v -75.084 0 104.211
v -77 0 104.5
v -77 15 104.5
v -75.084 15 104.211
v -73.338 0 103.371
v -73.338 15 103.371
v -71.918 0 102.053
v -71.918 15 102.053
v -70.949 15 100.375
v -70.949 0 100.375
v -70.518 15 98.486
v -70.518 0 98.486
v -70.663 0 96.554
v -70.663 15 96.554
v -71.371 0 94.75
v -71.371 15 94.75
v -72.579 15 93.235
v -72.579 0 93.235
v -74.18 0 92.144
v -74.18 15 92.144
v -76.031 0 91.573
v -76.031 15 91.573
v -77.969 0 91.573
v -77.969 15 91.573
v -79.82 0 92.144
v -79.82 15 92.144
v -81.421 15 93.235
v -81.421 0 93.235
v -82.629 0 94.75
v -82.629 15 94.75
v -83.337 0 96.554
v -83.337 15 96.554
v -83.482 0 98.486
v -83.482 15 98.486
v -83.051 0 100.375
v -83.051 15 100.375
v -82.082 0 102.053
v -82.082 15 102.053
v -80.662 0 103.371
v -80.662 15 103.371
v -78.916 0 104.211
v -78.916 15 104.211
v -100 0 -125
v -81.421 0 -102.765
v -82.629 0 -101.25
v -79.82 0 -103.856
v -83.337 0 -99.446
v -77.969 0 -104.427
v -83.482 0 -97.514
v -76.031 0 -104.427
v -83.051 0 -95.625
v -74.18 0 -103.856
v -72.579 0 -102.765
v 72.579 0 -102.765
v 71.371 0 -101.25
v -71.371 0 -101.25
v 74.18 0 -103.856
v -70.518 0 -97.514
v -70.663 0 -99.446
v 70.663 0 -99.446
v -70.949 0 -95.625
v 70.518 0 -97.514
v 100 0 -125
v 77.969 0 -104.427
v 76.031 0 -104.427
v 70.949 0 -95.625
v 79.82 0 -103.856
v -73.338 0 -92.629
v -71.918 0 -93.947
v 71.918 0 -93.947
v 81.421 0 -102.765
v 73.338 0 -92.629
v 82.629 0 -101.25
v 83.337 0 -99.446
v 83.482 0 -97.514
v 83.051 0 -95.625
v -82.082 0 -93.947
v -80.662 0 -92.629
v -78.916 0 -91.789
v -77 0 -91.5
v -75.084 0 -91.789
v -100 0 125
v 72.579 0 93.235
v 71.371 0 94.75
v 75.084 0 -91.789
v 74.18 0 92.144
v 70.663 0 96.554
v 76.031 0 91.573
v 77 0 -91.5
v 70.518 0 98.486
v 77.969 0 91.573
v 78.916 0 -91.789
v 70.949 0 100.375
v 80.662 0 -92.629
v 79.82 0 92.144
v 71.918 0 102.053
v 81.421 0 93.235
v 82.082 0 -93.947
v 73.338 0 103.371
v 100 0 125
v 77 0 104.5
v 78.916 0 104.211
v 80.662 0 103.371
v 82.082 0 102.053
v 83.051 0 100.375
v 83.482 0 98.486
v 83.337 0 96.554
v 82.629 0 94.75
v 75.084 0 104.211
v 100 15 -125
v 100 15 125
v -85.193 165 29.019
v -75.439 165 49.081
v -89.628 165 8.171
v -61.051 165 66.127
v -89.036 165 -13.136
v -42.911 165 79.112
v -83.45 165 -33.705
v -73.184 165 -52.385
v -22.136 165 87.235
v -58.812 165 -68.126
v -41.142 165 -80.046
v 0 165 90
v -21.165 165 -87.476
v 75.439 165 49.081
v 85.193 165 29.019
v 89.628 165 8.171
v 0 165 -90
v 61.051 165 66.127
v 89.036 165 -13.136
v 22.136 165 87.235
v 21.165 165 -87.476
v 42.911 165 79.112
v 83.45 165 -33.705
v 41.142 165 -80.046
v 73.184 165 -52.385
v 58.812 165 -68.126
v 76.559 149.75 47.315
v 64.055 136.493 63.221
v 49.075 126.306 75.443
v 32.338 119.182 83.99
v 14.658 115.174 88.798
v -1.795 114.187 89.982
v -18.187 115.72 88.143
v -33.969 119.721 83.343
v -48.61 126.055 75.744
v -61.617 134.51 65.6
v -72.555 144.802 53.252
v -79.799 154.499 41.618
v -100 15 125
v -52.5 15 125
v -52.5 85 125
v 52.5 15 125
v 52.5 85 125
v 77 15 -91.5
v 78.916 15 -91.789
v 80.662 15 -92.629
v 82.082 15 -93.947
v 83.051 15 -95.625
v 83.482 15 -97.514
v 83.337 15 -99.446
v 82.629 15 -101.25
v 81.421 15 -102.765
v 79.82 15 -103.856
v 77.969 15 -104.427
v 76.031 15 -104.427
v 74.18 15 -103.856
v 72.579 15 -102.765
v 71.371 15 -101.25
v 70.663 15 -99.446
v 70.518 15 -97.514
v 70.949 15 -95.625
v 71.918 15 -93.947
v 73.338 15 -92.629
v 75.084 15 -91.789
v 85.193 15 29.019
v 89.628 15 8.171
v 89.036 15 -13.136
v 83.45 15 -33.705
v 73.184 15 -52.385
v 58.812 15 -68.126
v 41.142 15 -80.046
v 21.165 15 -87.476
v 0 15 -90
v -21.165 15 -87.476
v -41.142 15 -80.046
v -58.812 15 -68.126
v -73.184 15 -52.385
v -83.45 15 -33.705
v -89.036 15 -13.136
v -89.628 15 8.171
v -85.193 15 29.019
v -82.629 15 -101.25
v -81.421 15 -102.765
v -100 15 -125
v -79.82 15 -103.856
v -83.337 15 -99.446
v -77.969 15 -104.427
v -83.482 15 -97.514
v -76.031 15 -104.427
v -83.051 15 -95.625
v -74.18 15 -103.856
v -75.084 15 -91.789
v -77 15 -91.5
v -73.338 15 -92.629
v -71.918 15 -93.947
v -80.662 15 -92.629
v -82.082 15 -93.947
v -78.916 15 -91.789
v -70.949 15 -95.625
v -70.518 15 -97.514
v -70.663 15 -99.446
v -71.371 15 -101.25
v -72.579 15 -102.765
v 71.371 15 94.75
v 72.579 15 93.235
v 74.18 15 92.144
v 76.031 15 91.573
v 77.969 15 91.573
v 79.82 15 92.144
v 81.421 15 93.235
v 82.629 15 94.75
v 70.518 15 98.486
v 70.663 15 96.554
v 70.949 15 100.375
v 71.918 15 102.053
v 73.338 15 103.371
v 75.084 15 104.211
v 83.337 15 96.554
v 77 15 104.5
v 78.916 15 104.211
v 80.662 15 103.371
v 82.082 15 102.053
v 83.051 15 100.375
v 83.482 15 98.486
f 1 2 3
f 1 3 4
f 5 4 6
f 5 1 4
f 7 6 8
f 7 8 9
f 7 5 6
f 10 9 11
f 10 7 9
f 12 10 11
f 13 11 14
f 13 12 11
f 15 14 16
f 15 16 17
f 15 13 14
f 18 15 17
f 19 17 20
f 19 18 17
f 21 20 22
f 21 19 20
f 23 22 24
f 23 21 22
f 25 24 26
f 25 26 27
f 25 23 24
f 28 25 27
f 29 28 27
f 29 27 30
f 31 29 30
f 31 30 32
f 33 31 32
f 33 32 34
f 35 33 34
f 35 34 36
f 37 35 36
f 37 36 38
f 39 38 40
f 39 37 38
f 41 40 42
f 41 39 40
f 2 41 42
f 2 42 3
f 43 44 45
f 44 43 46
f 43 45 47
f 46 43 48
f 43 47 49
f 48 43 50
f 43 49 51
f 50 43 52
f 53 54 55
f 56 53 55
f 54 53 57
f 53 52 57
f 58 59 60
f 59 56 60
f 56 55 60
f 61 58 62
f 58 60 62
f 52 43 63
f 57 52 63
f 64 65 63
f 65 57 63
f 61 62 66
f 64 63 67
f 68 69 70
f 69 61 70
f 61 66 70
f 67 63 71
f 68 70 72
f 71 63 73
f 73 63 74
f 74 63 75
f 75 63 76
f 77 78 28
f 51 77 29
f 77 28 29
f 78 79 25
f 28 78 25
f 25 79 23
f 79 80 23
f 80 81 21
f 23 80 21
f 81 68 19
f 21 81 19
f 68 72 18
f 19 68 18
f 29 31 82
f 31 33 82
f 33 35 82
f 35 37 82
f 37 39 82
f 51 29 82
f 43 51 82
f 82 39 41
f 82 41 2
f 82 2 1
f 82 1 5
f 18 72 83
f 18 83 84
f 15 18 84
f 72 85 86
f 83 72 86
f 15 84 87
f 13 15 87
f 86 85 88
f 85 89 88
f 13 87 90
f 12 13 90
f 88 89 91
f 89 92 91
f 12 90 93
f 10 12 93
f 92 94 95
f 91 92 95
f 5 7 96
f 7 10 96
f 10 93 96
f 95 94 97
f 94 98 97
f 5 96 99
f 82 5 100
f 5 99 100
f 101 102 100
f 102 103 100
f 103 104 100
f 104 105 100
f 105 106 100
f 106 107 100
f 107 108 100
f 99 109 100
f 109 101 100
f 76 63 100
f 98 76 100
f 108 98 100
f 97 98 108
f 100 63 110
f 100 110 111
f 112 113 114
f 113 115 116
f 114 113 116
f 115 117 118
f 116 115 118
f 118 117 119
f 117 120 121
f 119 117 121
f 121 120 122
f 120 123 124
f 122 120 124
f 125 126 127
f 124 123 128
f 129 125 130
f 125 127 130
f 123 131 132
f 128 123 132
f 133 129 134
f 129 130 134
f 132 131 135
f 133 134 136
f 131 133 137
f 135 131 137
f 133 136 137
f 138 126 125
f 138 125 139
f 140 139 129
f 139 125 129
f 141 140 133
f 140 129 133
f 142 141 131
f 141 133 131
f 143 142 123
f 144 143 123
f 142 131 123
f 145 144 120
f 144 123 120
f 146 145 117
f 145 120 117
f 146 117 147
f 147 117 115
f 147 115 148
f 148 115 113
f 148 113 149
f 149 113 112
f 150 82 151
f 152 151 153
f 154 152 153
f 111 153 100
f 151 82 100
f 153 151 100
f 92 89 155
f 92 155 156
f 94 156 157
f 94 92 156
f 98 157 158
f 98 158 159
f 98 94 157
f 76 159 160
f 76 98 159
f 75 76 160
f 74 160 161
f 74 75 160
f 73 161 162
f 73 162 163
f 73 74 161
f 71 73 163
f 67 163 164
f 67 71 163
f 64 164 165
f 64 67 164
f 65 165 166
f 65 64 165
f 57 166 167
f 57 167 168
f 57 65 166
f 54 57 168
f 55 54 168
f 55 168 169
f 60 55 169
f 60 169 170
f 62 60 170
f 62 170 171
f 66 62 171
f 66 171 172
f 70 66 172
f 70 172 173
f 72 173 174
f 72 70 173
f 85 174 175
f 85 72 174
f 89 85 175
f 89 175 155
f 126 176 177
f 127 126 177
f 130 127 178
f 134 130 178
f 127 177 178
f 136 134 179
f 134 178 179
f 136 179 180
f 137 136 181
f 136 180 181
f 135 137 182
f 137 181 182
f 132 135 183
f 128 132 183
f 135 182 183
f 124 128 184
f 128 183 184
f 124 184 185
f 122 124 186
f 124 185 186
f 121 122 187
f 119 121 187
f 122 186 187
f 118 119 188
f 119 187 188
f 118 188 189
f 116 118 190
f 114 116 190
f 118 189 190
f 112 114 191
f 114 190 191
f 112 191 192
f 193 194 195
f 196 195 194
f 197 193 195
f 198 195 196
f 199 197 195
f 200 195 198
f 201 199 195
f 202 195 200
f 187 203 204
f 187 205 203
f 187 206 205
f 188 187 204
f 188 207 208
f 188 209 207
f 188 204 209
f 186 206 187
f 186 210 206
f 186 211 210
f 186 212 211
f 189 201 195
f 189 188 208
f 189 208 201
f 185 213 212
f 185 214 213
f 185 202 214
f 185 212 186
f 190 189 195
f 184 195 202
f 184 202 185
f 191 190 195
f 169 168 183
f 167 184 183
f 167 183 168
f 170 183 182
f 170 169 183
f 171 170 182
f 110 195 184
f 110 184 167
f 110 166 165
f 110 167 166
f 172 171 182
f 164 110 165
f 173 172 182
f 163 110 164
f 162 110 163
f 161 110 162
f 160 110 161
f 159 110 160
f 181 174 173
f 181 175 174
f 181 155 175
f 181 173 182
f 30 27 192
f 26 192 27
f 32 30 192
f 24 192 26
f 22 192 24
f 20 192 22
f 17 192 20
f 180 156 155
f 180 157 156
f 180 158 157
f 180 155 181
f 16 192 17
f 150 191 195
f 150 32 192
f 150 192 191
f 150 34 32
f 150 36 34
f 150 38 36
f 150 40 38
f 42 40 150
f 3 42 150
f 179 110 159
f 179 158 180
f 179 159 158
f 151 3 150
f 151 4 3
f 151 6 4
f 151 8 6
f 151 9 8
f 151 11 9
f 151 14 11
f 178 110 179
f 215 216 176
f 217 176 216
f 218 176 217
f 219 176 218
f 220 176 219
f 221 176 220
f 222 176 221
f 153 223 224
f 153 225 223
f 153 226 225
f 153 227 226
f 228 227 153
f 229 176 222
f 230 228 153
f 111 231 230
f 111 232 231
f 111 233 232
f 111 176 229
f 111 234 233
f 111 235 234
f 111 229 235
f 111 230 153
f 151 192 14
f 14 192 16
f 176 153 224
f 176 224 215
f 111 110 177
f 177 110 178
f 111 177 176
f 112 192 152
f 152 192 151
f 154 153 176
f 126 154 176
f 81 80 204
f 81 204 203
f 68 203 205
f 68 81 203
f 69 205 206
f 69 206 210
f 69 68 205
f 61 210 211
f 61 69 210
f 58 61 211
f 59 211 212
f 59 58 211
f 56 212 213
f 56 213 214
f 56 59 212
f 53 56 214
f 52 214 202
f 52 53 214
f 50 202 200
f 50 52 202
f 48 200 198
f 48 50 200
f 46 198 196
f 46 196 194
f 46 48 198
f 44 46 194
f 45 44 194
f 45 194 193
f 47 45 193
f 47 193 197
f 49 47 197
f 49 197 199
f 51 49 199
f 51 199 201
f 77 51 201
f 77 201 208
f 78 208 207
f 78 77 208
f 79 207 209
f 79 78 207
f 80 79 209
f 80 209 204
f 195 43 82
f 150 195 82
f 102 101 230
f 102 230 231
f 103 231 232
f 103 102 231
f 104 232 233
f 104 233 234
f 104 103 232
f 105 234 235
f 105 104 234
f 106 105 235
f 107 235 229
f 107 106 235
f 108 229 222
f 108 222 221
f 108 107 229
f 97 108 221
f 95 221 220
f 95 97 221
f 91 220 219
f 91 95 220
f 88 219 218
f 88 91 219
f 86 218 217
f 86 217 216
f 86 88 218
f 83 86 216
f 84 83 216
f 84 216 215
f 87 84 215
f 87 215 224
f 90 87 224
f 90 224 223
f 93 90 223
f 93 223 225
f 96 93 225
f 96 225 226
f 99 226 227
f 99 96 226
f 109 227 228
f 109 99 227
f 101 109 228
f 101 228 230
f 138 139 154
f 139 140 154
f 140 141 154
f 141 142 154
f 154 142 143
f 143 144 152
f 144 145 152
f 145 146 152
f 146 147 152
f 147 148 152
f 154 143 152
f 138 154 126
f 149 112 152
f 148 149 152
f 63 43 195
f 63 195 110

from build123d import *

# Parameters (mm, degrees)
SKETCH1_W               = 250
SKETCH1_H               = 200
SKETCH1_R               = 6.5
BOSS_EXTRUDE1_DEPTH     = 15
BOSS_EXTRUDE2_DEPTH     = 150
CUT_EXTRUDE1_DEPTH      = 101
CUT_EXTRUDE1_DEPTH_BACK = 101
BOSS_EXTRUDE3_REACH     = 167
BODY_MOVE_COPY1_ANGLE   = 90


with BuildPart() as part:
    # Sketch1 → Boss-Extrude1 (new body)
    with BuildSketch(Plane(origin=(0, 0, 0), x_dir=(1, 0, 0), z_dir=(0, 1, 0))):
        Rectangle(SKETCH1_W, SKETCH1_H)
        with Locations((-98, 77)):
            Circle(SKETCH1_R, mode=Mode.SUBTRACT)
        with Locations((98, 77)):
            Circle(SKETCH1_R, mode=Mode.SUBTRACT)
        with Locations((-98, -77)):
            Circle(SKETCH1_R, mode=Mode.SUBTRACT)
        with Locations((98, -77)):
            Circle(SKETCH1_R, mode=Mode.SUBTRACT)
    extrude(amount=BOSS_EXTRUDE1_DEPTH)

    # Sketch2 → Boss-Extrude2 (add)
    with BuildSketch(Plane(origin=(0, 15, 0), x_dir=(1, 0, 0), z_dir=(0, 1, 0))):
        with BuildLine():
            Line((125, 52.5), (29.018785036, 85.193368962))
            ThreePointArc((29.018785036, 85.193368962), (-90, 0), (29.018785036, -85.193368962))
            Line((29.018785036, -85.193368962), (125, -52.5))
            Line((125, -52.5), (125, 52.5))
        make_face()
    extrude(amount=BOSS_EXTRUDE2_DEPTH)

    # Sketch3 → Cut-Extrude1 (cut, two sides)
    with BuildSketch(Plane.XY) as cut_extrude1_sk:
        Polygon((-384.335484925, 509.529308254), (29.018785036, 165), (125, 85), (538.354269961, -259.529308254), (1227.412886469, 567.179231668), (304.723131583, 1336.237848176), align=None)
    extrude(amount=CUT_EXTRUDE1_DEPTH, mode=Mode.SUBTRACT)
    extrude(cut_extrude1_sk.sketch, amount=-CUT_EXTRUDE1_DEPTH_BACK, mode=Mode.SUBTRACT)

    # Sketch4 → Boss-Extrude3 (add, up to next)
    with BuildSketch(Plane(origin=(0, 165, 0), x_dir=(1, 0, 0), z_dir=(0, 1, 0)), mode=Mode.PRIVATE) as boss_extrude3_sk1:
        with BuildLine():
            Line((29.018785036, -85.193368962), (29.018785036, 85.193368962))
            ThreePointArc((29.018785036, 85.193368962), (90, 0), (29.018785036, -85.193368962))
        make_face()
    boss_extrude3_tool1 = extrude(boss_extrude3_sk1.sketch, amount=-BOSS_EXTRUDE3_REACH, mode=Mode.PRIVATE) - part.part
    add(boss_extrude3_tool1.solids().sort_by_distance((54.295969, 165, 0))[0])


with BuildPart() as part_1:
    # Body-Move/Copy1: moved
    add(part.part.rotate(Axis((0, 0, 0), (0, -1, 0)), BODY_MOVE_COPY1_ANGLE))


solid = part_1.part
